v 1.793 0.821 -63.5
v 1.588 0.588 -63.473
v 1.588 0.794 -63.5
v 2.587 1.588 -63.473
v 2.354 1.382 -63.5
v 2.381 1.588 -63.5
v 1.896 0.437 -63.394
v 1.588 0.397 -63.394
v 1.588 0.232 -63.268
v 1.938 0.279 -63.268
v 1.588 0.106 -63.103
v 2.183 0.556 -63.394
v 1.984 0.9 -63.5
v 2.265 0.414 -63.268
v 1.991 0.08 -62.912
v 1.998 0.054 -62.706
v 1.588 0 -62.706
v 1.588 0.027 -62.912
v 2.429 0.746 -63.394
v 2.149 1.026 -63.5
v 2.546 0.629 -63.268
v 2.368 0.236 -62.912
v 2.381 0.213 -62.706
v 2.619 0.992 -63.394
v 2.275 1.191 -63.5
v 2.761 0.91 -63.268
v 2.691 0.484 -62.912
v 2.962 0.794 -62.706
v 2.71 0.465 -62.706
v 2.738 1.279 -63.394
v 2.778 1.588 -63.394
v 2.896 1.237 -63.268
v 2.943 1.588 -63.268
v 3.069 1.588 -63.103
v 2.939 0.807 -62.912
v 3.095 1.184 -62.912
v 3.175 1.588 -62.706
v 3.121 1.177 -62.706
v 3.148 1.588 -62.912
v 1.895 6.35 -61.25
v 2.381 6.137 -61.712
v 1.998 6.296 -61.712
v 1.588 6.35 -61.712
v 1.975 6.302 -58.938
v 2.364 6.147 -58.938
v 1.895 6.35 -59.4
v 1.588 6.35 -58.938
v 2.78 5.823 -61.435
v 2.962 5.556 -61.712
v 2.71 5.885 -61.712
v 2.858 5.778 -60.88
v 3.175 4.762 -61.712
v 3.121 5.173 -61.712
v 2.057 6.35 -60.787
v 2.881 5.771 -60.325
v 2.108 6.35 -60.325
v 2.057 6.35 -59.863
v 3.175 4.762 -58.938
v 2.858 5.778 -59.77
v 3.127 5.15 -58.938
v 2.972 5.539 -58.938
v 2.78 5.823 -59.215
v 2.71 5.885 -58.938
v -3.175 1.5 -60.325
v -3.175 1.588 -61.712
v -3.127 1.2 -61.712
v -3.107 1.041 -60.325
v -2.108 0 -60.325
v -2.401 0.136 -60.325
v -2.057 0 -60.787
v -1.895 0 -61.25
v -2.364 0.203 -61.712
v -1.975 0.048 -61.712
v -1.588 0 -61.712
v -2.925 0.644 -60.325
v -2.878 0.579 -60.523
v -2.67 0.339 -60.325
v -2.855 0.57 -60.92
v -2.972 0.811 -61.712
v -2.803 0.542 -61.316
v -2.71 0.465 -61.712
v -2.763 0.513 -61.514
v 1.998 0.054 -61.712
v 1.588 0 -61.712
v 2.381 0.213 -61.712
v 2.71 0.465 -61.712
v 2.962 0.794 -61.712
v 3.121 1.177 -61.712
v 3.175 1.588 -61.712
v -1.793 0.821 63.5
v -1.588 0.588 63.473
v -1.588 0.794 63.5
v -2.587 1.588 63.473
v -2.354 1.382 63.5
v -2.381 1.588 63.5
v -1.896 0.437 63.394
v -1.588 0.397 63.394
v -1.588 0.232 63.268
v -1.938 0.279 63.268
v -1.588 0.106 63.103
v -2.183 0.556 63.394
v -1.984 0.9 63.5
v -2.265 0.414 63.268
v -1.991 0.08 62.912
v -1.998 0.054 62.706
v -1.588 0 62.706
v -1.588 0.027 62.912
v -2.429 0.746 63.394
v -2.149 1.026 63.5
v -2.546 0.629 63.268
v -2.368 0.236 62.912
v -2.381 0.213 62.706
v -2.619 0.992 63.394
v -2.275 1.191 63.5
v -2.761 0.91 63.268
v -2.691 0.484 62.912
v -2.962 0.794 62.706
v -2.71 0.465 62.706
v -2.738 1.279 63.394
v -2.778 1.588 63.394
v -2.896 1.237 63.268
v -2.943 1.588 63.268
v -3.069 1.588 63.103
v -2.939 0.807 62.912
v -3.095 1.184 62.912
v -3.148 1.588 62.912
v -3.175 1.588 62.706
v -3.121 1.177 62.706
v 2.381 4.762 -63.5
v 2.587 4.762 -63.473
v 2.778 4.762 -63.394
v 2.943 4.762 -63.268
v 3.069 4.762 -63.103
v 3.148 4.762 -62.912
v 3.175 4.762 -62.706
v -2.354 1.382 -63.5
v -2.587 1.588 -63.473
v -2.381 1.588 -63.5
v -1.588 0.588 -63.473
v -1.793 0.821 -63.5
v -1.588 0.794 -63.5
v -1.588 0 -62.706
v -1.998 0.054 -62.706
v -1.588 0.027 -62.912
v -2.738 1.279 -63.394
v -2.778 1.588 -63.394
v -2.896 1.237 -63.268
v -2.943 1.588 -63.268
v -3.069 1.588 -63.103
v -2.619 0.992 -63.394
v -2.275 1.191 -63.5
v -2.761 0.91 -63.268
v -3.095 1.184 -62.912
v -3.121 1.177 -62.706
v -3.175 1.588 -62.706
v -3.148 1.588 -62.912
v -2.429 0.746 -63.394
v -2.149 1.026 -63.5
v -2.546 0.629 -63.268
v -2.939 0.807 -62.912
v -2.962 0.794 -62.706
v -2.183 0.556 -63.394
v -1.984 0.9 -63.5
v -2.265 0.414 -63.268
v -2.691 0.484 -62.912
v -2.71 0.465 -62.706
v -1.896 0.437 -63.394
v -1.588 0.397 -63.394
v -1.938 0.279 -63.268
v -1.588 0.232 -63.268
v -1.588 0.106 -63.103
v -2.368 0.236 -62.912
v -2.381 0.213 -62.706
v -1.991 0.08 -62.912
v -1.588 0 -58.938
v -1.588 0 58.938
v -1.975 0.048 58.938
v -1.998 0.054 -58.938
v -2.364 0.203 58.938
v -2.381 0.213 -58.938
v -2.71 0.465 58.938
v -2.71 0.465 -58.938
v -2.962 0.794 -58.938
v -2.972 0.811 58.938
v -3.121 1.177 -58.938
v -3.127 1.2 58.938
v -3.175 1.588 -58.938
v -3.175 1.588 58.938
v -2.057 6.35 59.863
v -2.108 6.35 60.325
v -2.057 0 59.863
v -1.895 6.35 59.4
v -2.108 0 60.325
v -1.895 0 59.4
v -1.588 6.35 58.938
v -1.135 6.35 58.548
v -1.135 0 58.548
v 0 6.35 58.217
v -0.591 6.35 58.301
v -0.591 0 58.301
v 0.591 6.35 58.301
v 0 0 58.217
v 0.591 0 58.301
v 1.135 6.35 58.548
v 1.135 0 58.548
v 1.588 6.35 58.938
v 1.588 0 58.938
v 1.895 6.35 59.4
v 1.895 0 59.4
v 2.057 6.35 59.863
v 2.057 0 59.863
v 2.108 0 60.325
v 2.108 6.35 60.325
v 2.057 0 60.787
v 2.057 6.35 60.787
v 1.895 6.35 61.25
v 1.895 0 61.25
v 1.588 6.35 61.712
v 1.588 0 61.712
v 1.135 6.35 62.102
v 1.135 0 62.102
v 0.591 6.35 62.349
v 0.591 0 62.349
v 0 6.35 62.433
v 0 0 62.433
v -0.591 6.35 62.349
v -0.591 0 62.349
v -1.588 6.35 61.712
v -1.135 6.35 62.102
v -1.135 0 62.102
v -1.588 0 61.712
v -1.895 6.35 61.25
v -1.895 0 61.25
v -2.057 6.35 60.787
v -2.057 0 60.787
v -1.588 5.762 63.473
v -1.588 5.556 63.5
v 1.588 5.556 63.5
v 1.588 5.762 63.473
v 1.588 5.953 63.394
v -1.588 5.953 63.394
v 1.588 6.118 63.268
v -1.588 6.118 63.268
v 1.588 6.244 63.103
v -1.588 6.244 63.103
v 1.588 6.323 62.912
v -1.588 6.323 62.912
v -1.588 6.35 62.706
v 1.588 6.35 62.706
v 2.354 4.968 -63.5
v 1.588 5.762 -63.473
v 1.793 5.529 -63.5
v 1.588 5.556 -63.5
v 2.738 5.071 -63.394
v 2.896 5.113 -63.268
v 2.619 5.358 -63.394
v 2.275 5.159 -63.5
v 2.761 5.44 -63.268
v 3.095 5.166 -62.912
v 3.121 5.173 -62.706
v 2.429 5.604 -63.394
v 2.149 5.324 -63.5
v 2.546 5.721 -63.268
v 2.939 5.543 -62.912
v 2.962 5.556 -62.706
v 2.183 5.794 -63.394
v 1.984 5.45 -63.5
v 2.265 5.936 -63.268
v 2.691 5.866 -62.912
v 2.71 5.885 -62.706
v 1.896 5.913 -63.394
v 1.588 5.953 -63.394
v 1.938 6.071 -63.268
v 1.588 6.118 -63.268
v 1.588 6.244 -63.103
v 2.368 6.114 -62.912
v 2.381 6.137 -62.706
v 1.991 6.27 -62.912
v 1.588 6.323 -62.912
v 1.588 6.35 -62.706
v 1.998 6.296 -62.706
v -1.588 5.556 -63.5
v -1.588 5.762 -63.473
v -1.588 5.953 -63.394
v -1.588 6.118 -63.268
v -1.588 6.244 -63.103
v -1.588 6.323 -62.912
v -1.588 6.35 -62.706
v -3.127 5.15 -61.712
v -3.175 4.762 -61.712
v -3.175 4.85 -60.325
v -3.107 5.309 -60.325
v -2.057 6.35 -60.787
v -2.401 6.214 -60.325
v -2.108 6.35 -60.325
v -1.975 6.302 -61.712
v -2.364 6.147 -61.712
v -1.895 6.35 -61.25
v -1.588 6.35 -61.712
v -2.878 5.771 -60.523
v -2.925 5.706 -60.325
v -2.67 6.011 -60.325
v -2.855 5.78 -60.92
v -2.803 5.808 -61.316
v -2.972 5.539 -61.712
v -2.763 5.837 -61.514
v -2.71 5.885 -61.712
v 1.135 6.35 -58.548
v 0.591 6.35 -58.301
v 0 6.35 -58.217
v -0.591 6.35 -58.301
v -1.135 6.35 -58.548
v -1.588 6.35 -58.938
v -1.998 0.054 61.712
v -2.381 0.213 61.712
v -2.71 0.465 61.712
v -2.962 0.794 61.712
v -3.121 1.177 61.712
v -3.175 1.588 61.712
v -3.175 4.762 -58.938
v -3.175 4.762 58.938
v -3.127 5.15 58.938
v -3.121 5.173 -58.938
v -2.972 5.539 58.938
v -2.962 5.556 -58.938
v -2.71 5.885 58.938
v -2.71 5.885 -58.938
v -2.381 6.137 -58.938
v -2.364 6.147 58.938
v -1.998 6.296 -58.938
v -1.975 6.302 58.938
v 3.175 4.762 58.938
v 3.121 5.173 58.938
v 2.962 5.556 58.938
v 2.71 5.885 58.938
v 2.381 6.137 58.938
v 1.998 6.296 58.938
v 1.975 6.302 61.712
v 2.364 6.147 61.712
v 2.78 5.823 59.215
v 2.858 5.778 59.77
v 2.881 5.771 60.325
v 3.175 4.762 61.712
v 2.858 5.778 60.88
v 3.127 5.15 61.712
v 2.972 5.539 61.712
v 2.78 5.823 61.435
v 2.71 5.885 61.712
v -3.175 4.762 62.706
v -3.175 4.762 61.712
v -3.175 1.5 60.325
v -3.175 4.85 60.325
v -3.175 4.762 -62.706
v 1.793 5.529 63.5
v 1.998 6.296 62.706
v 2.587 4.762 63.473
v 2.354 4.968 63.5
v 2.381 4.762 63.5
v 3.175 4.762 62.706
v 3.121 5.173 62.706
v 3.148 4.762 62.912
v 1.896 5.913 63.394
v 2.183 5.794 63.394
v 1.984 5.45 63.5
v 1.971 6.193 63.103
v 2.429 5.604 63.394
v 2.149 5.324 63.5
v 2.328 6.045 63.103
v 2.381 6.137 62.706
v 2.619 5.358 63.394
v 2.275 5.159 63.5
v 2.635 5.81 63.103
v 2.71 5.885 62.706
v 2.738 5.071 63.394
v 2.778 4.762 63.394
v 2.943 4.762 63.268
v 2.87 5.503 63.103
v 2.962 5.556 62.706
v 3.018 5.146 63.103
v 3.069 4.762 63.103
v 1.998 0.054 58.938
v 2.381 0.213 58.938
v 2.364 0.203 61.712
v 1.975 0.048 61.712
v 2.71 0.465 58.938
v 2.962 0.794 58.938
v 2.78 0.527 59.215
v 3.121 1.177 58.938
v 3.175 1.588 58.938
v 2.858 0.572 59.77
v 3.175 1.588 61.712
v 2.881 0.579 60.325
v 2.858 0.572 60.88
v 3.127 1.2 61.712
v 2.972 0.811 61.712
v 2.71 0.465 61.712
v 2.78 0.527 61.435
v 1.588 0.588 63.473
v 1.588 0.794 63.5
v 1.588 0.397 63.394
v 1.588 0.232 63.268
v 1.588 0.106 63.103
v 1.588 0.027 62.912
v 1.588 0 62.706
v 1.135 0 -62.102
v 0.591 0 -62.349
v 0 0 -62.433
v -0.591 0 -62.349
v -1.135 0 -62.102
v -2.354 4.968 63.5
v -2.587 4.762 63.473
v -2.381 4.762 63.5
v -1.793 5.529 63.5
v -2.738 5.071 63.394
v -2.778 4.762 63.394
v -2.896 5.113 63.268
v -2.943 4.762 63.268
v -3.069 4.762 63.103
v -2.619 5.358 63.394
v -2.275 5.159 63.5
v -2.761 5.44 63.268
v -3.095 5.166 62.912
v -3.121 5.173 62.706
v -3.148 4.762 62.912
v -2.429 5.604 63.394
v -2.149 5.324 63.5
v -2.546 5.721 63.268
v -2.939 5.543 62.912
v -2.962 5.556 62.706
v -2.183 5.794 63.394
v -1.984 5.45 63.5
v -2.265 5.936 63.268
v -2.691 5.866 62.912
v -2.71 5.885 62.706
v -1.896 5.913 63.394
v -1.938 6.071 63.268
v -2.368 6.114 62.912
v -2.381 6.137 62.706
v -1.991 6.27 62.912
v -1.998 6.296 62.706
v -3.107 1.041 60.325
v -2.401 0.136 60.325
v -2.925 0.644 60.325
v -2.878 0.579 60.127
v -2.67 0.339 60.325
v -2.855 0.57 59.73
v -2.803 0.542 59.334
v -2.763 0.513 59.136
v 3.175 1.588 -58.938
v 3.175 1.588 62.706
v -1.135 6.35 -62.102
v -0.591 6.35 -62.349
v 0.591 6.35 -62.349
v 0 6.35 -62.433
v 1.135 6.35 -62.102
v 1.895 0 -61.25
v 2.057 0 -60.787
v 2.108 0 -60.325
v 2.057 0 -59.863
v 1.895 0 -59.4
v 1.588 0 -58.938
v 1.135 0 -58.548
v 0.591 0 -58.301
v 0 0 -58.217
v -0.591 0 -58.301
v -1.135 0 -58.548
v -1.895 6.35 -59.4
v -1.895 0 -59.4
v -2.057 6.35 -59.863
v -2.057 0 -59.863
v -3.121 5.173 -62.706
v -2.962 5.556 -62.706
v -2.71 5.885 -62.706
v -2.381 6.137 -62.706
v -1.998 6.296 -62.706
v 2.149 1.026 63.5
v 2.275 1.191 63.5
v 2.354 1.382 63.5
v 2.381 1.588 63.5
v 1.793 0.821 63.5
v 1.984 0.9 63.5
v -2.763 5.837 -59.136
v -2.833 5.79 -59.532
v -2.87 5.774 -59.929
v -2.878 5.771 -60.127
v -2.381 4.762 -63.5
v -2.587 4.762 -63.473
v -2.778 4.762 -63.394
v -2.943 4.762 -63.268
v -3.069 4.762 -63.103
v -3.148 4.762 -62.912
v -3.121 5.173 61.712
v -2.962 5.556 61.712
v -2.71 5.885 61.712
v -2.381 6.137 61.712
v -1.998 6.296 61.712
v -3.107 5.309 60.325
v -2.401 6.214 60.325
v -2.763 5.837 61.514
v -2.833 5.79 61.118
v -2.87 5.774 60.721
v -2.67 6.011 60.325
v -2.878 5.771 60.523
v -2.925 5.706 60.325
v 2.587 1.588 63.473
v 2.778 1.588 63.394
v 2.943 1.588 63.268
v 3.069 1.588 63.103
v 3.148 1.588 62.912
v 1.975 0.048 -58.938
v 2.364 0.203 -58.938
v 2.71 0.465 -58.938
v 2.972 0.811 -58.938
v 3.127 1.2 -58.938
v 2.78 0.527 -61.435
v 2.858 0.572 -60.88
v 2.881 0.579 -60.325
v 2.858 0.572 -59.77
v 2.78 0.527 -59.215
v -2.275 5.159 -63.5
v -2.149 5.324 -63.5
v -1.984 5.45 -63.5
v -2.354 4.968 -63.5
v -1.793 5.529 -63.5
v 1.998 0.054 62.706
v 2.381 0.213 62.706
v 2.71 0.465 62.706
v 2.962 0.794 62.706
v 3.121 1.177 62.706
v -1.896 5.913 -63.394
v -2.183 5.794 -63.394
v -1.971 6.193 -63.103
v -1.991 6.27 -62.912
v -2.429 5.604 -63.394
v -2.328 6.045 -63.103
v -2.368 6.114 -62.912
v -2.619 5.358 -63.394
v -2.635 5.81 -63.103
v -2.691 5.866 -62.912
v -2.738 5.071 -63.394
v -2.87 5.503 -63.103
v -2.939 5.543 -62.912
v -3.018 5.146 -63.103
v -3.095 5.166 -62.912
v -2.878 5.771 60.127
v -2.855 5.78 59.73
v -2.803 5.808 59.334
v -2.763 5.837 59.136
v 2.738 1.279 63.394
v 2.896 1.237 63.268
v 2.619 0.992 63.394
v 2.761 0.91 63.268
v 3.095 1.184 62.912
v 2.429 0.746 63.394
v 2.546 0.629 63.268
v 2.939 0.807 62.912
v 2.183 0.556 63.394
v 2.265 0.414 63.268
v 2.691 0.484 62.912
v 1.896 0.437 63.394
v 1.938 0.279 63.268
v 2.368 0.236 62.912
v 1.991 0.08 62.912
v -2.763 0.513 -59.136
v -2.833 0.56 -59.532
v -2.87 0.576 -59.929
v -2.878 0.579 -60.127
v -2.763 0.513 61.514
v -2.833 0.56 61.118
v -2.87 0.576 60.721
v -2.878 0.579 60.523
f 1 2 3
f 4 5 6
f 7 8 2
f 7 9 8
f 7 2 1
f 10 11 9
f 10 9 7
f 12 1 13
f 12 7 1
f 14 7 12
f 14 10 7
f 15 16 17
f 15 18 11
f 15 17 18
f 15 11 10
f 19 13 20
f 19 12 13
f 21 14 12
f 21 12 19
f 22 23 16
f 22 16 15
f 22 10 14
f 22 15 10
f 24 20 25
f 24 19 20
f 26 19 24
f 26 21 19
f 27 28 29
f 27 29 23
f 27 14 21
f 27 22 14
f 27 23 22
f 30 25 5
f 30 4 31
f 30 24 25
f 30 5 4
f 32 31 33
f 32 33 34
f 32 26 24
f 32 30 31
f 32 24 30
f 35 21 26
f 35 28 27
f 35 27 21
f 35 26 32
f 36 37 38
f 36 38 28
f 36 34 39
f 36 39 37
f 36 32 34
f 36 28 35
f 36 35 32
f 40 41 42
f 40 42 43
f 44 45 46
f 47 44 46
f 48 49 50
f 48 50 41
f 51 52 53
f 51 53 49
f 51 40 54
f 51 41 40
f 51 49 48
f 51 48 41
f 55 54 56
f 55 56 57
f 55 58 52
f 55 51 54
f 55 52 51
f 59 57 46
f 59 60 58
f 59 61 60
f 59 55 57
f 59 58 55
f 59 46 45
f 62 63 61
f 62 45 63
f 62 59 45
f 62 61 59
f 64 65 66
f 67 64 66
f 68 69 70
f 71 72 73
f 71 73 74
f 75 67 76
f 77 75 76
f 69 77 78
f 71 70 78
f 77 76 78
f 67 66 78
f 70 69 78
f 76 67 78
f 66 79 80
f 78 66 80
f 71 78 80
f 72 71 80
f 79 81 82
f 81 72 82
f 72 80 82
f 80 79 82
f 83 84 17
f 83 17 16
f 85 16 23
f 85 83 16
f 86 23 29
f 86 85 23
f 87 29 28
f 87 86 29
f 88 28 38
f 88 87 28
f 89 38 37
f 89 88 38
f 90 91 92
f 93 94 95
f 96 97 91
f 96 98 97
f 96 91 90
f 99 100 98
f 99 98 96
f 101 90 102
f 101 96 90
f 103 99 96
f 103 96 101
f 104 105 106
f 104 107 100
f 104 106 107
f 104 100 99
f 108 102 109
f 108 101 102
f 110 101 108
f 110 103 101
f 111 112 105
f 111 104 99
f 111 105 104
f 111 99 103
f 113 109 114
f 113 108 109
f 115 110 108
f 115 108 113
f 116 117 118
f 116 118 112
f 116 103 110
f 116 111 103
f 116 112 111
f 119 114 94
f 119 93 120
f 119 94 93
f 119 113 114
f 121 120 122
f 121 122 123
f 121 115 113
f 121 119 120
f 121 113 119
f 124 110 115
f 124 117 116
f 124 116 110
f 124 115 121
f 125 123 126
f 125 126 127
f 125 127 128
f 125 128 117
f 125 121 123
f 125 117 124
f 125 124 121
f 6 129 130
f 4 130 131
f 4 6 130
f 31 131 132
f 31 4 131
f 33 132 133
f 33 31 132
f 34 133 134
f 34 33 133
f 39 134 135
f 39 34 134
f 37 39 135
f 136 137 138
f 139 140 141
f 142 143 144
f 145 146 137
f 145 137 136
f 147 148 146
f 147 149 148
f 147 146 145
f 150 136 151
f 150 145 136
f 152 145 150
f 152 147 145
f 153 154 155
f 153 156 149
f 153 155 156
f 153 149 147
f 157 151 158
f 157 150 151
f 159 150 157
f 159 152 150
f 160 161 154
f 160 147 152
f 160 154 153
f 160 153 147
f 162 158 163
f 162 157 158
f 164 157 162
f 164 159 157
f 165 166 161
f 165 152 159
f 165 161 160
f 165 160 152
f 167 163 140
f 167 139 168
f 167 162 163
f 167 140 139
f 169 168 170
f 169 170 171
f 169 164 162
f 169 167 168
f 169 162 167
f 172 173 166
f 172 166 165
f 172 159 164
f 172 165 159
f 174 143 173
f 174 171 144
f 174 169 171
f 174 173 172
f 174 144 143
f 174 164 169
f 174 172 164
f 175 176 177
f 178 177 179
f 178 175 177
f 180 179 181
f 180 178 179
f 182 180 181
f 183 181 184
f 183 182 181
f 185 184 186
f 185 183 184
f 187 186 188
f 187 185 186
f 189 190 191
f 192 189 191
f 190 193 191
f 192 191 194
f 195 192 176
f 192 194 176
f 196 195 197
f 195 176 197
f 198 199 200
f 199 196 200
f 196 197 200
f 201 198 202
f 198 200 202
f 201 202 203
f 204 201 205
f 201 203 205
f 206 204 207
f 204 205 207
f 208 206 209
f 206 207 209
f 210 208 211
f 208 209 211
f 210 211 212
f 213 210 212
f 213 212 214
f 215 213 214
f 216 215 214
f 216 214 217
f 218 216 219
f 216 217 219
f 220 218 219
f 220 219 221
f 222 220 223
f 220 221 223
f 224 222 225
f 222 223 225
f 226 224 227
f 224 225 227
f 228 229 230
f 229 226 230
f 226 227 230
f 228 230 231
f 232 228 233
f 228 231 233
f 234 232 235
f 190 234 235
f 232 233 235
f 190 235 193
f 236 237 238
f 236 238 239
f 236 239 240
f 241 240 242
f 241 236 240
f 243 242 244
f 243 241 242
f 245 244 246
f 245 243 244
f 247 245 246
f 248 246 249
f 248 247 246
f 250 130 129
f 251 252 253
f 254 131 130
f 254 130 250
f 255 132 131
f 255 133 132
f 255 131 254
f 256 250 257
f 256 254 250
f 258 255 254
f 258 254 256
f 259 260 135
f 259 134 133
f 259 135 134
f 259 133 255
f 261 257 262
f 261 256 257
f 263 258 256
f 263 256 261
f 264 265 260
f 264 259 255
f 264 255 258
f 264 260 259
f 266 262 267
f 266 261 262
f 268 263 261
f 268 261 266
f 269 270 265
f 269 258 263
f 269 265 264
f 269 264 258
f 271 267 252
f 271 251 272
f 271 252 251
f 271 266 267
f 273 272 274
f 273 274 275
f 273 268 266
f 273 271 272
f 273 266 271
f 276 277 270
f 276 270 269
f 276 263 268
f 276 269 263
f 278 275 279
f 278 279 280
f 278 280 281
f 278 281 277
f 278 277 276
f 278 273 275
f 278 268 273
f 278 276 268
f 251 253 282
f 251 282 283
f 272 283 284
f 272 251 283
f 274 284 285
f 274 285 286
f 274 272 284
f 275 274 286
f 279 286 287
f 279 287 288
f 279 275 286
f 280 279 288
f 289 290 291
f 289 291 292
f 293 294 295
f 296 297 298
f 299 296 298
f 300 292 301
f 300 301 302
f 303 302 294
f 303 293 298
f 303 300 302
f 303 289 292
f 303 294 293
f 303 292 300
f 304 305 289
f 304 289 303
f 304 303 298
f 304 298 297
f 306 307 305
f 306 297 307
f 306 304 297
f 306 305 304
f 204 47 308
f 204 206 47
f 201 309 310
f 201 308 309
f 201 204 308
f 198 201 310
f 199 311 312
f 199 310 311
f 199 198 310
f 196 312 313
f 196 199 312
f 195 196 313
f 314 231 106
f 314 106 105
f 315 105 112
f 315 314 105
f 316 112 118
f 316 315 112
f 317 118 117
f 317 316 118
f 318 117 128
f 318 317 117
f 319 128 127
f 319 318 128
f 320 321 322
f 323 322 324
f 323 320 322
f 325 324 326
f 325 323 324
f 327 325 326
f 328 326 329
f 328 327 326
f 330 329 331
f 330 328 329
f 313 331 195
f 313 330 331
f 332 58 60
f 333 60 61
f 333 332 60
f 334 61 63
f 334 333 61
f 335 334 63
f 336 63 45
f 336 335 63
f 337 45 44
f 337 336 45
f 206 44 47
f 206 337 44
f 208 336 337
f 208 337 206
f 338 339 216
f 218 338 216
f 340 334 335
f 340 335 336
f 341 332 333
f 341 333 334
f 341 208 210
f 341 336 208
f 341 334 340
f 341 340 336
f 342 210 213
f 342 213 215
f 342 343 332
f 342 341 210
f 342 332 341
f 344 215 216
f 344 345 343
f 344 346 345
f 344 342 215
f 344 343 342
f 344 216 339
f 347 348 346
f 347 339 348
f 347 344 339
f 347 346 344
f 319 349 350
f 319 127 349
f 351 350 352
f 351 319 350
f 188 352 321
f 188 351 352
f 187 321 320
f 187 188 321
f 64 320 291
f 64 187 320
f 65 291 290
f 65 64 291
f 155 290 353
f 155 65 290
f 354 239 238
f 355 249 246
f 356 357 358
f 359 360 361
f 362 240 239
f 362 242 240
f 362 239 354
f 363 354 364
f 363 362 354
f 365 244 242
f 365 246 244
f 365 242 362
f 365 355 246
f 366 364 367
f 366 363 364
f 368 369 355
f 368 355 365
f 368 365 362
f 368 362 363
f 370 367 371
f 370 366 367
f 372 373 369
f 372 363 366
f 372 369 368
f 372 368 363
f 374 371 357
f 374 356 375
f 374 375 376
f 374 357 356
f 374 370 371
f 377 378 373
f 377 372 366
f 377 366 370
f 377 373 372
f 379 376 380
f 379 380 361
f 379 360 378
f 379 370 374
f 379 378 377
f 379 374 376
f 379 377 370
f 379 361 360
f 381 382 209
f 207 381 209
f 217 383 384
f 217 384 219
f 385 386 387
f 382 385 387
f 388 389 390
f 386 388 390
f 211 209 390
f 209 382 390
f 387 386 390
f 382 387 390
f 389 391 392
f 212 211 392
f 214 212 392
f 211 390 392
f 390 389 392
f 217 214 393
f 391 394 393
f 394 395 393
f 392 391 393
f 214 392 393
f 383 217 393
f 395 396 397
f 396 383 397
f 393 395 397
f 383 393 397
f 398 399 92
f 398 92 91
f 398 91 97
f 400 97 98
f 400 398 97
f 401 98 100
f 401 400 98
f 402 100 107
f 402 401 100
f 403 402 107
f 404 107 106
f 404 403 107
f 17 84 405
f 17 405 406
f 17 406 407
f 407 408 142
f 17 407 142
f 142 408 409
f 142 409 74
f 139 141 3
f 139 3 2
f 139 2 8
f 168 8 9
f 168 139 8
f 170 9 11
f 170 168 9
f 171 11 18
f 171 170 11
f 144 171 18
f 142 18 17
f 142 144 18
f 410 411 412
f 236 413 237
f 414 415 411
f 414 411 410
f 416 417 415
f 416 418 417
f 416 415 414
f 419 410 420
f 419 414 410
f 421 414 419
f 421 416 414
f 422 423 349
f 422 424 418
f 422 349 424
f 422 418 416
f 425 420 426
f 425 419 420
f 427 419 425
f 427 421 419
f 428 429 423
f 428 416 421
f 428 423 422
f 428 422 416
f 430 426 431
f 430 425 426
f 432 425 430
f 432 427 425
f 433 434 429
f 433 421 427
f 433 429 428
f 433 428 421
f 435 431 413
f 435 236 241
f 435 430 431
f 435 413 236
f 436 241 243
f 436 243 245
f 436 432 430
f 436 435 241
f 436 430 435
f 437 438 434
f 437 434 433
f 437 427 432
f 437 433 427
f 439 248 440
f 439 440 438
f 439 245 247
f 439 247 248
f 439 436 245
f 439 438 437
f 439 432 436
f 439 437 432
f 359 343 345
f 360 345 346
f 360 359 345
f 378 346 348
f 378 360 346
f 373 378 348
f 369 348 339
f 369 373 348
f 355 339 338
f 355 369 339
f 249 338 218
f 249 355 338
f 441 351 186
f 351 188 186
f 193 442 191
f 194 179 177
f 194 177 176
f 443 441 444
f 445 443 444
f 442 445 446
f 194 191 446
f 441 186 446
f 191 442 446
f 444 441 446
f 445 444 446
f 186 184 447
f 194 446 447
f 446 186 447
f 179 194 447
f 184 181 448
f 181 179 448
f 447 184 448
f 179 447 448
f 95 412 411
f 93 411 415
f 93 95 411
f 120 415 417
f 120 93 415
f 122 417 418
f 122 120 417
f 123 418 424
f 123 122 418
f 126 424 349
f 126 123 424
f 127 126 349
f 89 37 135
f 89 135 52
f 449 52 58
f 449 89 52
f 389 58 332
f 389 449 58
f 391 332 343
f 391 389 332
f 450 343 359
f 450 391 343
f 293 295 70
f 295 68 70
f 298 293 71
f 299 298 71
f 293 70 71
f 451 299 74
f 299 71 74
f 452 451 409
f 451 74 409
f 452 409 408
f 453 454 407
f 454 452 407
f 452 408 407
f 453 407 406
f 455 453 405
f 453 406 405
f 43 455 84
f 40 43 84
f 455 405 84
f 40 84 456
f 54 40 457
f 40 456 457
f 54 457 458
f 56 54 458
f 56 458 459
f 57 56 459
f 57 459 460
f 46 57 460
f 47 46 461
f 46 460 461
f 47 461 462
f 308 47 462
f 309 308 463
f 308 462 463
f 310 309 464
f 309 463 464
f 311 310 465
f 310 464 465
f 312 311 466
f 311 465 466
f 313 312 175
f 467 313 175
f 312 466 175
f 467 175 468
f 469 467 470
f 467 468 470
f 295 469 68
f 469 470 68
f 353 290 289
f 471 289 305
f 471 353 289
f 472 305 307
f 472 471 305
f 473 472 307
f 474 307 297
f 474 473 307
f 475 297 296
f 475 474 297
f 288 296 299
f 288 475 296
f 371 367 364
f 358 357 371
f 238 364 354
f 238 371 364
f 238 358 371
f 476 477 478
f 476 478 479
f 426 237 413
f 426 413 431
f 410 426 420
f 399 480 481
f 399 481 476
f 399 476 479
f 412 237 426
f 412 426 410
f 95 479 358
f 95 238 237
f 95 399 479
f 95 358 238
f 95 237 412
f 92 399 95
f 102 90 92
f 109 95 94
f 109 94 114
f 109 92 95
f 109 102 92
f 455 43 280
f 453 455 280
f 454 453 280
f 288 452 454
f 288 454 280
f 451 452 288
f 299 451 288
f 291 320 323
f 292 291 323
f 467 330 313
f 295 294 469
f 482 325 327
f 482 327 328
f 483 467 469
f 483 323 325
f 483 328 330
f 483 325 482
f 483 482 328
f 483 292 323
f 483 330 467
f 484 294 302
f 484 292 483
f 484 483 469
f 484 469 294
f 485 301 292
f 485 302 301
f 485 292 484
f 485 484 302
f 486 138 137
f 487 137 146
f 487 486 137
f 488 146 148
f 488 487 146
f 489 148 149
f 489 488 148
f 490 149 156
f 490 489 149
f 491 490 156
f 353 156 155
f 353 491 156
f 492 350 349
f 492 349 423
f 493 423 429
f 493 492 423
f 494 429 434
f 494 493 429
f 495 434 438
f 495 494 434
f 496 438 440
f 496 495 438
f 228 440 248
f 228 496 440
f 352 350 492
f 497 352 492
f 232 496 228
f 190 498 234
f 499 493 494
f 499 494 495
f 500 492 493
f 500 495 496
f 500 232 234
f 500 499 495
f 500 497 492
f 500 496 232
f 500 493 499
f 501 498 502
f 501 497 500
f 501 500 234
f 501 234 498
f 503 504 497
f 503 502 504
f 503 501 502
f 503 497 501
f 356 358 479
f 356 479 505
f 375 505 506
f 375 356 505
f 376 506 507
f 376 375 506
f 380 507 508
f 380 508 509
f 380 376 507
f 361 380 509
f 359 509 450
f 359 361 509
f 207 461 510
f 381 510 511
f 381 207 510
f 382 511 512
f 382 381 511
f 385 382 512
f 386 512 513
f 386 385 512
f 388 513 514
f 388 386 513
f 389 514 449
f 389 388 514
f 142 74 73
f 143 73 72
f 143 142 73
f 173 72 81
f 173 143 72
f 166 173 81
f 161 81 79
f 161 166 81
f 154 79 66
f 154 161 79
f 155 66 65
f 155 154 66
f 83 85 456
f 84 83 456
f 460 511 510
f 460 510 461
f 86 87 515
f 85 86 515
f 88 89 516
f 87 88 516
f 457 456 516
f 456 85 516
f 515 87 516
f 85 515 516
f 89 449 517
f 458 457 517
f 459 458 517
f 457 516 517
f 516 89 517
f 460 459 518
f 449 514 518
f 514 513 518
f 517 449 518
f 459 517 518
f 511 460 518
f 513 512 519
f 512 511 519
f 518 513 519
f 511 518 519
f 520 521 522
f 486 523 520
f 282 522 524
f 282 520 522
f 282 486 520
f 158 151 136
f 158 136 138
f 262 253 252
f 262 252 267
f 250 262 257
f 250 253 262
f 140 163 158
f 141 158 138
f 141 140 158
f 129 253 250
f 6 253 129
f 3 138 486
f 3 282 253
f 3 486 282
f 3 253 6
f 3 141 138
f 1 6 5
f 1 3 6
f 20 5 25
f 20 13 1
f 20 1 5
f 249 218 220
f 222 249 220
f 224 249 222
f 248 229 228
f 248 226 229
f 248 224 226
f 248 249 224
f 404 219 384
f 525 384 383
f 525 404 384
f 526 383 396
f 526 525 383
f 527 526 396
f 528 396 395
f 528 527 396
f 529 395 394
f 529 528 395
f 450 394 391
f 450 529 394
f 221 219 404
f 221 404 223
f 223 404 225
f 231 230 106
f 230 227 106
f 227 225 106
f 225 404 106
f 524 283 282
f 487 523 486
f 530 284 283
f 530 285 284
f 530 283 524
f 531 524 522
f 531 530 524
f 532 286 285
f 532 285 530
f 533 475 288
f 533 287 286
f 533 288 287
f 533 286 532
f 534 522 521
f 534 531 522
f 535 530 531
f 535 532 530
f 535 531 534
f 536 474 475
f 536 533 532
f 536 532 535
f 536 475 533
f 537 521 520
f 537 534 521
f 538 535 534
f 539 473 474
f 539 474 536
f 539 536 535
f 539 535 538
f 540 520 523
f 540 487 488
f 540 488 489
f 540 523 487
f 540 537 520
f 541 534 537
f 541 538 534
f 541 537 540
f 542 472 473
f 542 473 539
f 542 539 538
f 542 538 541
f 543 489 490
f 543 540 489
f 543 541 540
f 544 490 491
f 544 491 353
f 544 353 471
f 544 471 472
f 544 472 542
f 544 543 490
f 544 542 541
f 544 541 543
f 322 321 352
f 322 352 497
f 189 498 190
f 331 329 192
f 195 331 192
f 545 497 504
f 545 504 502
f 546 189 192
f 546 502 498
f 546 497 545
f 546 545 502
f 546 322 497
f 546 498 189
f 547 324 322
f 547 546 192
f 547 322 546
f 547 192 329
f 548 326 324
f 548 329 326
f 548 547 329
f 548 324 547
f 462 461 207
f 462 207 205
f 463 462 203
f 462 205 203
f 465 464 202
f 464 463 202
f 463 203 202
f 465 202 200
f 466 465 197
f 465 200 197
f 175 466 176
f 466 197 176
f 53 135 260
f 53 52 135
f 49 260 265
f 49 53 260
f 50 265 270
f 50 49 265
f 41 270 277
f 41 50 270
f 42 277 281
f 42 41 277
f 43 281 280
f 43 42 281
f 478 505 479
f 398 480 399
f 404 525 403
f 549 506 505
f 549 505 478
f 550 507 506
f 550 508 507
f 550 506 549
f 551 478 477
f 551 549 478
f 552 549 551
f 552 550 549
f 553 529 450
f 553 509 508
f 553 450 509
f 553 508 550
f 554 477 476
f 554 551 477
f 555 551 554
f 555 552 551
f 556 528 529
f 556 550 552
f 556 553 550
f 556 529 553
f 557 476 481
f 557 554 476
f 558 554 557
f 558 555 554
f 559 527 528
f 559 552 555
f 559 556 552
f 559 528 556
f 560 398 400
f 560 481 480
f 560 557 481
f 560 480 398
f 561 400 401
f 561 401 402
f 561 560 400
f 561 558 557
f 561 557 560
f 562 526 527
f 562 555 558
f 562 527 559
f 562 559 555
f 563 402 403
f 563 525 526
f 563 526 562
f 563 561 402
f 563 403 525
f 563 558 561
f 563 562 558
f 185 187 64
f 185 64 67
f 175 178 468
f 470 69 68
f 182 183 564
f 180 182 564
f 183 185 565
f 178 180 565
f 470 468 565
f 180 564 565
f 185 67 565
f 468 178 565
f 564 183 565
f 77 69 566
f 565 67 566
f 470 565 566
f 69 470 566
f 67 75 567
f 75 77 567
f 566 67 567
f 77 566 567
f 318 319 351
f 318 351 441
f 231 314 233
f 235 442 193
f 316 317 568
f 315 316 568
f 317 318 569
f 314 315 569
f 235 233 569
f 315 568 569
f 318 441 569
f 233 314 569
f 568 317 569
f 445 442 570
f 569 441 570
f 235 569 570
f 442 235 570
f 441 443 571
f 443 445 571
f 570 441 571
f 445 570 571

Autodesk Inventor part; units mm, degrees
ref_plane "YZ Plane" through (0, 0, 0) normal (1, 0, 0) x (0, 1, 0)
ref_plane "XZ Plane" through (0, 0, 0) normal (0, 1, 0) x (-1, 0, 0)
ref_plane "XY Plane" through (0, 0, 0) normal (0, 0, 1) x (1, 0, 0)
sketch "Sketch1" plane through (0, 0, 0) normal (0, 1, 0) x (-1, 0, 0)
  line L0 (3.175, -63.5) -> (-3.175, -63.5)
  line L1 (-3.175, -63.5) -> (-3.175, 63.5)
  line L2 (-3.175, 63.5) -> (3.175, 63.5)
  line L3 (3.175, 63.5) -> (3.175, -63.5)
  line L4 (3.175, -63.5) -> (-3.175, 63.5) construction
  line L5 (-3.175, -63.5) -> (3.175, 63.5) construction
  circle A0 centre (0, 60.325) radius 2.1082
  circle A1 centre (0, -60.325) radius 2.1082
  point P0 (0, 0)
  dimension "d0" = 6.35
  dimension "d1" = 127
  dimension "d2" = 4.2164
  dimension "d3" = 4.2164
  dimension "d4" = 3.175
  dimension "d5" = 3.175
  dimension "d6" = 3.175
  dimension "d7" = 3.175
extrude "Extrusion1" add sketch "Sketch1" along normal blind 6.35
fillet "Fillet1" radius 1.5875 4 edges at (3.175, 0, 0) (-3.175, 0, 0) (3.175, 6.35, 0) (-3.175, 6.35, 0)
fillet "Fillet2" radius 0.7937 16 edges at (0, 6.35, -63.5) (-2.71, 5.885, -63.5) (-3.175, 3.175, -63.5) (-2.71, 0.465, -63.5) (0, 0, -63.5) (2.71, 0.465, -63.5) (3.175, 3.175, -63.5) (2.71, 5.885, -63.5) (2.71, 5.885, 63.5) (0, 6.35, 63.5) (-2.71, 5.885, 63.5) (-3.175, 3.175, 63.5) (-2.71, 0.465, 63.5) (0, 0, 63.5) (2.71, 0.465, 63.5) (3.175, 3.175, 63.5)
properties part number "cata Beam" material "Stainless Steel"
